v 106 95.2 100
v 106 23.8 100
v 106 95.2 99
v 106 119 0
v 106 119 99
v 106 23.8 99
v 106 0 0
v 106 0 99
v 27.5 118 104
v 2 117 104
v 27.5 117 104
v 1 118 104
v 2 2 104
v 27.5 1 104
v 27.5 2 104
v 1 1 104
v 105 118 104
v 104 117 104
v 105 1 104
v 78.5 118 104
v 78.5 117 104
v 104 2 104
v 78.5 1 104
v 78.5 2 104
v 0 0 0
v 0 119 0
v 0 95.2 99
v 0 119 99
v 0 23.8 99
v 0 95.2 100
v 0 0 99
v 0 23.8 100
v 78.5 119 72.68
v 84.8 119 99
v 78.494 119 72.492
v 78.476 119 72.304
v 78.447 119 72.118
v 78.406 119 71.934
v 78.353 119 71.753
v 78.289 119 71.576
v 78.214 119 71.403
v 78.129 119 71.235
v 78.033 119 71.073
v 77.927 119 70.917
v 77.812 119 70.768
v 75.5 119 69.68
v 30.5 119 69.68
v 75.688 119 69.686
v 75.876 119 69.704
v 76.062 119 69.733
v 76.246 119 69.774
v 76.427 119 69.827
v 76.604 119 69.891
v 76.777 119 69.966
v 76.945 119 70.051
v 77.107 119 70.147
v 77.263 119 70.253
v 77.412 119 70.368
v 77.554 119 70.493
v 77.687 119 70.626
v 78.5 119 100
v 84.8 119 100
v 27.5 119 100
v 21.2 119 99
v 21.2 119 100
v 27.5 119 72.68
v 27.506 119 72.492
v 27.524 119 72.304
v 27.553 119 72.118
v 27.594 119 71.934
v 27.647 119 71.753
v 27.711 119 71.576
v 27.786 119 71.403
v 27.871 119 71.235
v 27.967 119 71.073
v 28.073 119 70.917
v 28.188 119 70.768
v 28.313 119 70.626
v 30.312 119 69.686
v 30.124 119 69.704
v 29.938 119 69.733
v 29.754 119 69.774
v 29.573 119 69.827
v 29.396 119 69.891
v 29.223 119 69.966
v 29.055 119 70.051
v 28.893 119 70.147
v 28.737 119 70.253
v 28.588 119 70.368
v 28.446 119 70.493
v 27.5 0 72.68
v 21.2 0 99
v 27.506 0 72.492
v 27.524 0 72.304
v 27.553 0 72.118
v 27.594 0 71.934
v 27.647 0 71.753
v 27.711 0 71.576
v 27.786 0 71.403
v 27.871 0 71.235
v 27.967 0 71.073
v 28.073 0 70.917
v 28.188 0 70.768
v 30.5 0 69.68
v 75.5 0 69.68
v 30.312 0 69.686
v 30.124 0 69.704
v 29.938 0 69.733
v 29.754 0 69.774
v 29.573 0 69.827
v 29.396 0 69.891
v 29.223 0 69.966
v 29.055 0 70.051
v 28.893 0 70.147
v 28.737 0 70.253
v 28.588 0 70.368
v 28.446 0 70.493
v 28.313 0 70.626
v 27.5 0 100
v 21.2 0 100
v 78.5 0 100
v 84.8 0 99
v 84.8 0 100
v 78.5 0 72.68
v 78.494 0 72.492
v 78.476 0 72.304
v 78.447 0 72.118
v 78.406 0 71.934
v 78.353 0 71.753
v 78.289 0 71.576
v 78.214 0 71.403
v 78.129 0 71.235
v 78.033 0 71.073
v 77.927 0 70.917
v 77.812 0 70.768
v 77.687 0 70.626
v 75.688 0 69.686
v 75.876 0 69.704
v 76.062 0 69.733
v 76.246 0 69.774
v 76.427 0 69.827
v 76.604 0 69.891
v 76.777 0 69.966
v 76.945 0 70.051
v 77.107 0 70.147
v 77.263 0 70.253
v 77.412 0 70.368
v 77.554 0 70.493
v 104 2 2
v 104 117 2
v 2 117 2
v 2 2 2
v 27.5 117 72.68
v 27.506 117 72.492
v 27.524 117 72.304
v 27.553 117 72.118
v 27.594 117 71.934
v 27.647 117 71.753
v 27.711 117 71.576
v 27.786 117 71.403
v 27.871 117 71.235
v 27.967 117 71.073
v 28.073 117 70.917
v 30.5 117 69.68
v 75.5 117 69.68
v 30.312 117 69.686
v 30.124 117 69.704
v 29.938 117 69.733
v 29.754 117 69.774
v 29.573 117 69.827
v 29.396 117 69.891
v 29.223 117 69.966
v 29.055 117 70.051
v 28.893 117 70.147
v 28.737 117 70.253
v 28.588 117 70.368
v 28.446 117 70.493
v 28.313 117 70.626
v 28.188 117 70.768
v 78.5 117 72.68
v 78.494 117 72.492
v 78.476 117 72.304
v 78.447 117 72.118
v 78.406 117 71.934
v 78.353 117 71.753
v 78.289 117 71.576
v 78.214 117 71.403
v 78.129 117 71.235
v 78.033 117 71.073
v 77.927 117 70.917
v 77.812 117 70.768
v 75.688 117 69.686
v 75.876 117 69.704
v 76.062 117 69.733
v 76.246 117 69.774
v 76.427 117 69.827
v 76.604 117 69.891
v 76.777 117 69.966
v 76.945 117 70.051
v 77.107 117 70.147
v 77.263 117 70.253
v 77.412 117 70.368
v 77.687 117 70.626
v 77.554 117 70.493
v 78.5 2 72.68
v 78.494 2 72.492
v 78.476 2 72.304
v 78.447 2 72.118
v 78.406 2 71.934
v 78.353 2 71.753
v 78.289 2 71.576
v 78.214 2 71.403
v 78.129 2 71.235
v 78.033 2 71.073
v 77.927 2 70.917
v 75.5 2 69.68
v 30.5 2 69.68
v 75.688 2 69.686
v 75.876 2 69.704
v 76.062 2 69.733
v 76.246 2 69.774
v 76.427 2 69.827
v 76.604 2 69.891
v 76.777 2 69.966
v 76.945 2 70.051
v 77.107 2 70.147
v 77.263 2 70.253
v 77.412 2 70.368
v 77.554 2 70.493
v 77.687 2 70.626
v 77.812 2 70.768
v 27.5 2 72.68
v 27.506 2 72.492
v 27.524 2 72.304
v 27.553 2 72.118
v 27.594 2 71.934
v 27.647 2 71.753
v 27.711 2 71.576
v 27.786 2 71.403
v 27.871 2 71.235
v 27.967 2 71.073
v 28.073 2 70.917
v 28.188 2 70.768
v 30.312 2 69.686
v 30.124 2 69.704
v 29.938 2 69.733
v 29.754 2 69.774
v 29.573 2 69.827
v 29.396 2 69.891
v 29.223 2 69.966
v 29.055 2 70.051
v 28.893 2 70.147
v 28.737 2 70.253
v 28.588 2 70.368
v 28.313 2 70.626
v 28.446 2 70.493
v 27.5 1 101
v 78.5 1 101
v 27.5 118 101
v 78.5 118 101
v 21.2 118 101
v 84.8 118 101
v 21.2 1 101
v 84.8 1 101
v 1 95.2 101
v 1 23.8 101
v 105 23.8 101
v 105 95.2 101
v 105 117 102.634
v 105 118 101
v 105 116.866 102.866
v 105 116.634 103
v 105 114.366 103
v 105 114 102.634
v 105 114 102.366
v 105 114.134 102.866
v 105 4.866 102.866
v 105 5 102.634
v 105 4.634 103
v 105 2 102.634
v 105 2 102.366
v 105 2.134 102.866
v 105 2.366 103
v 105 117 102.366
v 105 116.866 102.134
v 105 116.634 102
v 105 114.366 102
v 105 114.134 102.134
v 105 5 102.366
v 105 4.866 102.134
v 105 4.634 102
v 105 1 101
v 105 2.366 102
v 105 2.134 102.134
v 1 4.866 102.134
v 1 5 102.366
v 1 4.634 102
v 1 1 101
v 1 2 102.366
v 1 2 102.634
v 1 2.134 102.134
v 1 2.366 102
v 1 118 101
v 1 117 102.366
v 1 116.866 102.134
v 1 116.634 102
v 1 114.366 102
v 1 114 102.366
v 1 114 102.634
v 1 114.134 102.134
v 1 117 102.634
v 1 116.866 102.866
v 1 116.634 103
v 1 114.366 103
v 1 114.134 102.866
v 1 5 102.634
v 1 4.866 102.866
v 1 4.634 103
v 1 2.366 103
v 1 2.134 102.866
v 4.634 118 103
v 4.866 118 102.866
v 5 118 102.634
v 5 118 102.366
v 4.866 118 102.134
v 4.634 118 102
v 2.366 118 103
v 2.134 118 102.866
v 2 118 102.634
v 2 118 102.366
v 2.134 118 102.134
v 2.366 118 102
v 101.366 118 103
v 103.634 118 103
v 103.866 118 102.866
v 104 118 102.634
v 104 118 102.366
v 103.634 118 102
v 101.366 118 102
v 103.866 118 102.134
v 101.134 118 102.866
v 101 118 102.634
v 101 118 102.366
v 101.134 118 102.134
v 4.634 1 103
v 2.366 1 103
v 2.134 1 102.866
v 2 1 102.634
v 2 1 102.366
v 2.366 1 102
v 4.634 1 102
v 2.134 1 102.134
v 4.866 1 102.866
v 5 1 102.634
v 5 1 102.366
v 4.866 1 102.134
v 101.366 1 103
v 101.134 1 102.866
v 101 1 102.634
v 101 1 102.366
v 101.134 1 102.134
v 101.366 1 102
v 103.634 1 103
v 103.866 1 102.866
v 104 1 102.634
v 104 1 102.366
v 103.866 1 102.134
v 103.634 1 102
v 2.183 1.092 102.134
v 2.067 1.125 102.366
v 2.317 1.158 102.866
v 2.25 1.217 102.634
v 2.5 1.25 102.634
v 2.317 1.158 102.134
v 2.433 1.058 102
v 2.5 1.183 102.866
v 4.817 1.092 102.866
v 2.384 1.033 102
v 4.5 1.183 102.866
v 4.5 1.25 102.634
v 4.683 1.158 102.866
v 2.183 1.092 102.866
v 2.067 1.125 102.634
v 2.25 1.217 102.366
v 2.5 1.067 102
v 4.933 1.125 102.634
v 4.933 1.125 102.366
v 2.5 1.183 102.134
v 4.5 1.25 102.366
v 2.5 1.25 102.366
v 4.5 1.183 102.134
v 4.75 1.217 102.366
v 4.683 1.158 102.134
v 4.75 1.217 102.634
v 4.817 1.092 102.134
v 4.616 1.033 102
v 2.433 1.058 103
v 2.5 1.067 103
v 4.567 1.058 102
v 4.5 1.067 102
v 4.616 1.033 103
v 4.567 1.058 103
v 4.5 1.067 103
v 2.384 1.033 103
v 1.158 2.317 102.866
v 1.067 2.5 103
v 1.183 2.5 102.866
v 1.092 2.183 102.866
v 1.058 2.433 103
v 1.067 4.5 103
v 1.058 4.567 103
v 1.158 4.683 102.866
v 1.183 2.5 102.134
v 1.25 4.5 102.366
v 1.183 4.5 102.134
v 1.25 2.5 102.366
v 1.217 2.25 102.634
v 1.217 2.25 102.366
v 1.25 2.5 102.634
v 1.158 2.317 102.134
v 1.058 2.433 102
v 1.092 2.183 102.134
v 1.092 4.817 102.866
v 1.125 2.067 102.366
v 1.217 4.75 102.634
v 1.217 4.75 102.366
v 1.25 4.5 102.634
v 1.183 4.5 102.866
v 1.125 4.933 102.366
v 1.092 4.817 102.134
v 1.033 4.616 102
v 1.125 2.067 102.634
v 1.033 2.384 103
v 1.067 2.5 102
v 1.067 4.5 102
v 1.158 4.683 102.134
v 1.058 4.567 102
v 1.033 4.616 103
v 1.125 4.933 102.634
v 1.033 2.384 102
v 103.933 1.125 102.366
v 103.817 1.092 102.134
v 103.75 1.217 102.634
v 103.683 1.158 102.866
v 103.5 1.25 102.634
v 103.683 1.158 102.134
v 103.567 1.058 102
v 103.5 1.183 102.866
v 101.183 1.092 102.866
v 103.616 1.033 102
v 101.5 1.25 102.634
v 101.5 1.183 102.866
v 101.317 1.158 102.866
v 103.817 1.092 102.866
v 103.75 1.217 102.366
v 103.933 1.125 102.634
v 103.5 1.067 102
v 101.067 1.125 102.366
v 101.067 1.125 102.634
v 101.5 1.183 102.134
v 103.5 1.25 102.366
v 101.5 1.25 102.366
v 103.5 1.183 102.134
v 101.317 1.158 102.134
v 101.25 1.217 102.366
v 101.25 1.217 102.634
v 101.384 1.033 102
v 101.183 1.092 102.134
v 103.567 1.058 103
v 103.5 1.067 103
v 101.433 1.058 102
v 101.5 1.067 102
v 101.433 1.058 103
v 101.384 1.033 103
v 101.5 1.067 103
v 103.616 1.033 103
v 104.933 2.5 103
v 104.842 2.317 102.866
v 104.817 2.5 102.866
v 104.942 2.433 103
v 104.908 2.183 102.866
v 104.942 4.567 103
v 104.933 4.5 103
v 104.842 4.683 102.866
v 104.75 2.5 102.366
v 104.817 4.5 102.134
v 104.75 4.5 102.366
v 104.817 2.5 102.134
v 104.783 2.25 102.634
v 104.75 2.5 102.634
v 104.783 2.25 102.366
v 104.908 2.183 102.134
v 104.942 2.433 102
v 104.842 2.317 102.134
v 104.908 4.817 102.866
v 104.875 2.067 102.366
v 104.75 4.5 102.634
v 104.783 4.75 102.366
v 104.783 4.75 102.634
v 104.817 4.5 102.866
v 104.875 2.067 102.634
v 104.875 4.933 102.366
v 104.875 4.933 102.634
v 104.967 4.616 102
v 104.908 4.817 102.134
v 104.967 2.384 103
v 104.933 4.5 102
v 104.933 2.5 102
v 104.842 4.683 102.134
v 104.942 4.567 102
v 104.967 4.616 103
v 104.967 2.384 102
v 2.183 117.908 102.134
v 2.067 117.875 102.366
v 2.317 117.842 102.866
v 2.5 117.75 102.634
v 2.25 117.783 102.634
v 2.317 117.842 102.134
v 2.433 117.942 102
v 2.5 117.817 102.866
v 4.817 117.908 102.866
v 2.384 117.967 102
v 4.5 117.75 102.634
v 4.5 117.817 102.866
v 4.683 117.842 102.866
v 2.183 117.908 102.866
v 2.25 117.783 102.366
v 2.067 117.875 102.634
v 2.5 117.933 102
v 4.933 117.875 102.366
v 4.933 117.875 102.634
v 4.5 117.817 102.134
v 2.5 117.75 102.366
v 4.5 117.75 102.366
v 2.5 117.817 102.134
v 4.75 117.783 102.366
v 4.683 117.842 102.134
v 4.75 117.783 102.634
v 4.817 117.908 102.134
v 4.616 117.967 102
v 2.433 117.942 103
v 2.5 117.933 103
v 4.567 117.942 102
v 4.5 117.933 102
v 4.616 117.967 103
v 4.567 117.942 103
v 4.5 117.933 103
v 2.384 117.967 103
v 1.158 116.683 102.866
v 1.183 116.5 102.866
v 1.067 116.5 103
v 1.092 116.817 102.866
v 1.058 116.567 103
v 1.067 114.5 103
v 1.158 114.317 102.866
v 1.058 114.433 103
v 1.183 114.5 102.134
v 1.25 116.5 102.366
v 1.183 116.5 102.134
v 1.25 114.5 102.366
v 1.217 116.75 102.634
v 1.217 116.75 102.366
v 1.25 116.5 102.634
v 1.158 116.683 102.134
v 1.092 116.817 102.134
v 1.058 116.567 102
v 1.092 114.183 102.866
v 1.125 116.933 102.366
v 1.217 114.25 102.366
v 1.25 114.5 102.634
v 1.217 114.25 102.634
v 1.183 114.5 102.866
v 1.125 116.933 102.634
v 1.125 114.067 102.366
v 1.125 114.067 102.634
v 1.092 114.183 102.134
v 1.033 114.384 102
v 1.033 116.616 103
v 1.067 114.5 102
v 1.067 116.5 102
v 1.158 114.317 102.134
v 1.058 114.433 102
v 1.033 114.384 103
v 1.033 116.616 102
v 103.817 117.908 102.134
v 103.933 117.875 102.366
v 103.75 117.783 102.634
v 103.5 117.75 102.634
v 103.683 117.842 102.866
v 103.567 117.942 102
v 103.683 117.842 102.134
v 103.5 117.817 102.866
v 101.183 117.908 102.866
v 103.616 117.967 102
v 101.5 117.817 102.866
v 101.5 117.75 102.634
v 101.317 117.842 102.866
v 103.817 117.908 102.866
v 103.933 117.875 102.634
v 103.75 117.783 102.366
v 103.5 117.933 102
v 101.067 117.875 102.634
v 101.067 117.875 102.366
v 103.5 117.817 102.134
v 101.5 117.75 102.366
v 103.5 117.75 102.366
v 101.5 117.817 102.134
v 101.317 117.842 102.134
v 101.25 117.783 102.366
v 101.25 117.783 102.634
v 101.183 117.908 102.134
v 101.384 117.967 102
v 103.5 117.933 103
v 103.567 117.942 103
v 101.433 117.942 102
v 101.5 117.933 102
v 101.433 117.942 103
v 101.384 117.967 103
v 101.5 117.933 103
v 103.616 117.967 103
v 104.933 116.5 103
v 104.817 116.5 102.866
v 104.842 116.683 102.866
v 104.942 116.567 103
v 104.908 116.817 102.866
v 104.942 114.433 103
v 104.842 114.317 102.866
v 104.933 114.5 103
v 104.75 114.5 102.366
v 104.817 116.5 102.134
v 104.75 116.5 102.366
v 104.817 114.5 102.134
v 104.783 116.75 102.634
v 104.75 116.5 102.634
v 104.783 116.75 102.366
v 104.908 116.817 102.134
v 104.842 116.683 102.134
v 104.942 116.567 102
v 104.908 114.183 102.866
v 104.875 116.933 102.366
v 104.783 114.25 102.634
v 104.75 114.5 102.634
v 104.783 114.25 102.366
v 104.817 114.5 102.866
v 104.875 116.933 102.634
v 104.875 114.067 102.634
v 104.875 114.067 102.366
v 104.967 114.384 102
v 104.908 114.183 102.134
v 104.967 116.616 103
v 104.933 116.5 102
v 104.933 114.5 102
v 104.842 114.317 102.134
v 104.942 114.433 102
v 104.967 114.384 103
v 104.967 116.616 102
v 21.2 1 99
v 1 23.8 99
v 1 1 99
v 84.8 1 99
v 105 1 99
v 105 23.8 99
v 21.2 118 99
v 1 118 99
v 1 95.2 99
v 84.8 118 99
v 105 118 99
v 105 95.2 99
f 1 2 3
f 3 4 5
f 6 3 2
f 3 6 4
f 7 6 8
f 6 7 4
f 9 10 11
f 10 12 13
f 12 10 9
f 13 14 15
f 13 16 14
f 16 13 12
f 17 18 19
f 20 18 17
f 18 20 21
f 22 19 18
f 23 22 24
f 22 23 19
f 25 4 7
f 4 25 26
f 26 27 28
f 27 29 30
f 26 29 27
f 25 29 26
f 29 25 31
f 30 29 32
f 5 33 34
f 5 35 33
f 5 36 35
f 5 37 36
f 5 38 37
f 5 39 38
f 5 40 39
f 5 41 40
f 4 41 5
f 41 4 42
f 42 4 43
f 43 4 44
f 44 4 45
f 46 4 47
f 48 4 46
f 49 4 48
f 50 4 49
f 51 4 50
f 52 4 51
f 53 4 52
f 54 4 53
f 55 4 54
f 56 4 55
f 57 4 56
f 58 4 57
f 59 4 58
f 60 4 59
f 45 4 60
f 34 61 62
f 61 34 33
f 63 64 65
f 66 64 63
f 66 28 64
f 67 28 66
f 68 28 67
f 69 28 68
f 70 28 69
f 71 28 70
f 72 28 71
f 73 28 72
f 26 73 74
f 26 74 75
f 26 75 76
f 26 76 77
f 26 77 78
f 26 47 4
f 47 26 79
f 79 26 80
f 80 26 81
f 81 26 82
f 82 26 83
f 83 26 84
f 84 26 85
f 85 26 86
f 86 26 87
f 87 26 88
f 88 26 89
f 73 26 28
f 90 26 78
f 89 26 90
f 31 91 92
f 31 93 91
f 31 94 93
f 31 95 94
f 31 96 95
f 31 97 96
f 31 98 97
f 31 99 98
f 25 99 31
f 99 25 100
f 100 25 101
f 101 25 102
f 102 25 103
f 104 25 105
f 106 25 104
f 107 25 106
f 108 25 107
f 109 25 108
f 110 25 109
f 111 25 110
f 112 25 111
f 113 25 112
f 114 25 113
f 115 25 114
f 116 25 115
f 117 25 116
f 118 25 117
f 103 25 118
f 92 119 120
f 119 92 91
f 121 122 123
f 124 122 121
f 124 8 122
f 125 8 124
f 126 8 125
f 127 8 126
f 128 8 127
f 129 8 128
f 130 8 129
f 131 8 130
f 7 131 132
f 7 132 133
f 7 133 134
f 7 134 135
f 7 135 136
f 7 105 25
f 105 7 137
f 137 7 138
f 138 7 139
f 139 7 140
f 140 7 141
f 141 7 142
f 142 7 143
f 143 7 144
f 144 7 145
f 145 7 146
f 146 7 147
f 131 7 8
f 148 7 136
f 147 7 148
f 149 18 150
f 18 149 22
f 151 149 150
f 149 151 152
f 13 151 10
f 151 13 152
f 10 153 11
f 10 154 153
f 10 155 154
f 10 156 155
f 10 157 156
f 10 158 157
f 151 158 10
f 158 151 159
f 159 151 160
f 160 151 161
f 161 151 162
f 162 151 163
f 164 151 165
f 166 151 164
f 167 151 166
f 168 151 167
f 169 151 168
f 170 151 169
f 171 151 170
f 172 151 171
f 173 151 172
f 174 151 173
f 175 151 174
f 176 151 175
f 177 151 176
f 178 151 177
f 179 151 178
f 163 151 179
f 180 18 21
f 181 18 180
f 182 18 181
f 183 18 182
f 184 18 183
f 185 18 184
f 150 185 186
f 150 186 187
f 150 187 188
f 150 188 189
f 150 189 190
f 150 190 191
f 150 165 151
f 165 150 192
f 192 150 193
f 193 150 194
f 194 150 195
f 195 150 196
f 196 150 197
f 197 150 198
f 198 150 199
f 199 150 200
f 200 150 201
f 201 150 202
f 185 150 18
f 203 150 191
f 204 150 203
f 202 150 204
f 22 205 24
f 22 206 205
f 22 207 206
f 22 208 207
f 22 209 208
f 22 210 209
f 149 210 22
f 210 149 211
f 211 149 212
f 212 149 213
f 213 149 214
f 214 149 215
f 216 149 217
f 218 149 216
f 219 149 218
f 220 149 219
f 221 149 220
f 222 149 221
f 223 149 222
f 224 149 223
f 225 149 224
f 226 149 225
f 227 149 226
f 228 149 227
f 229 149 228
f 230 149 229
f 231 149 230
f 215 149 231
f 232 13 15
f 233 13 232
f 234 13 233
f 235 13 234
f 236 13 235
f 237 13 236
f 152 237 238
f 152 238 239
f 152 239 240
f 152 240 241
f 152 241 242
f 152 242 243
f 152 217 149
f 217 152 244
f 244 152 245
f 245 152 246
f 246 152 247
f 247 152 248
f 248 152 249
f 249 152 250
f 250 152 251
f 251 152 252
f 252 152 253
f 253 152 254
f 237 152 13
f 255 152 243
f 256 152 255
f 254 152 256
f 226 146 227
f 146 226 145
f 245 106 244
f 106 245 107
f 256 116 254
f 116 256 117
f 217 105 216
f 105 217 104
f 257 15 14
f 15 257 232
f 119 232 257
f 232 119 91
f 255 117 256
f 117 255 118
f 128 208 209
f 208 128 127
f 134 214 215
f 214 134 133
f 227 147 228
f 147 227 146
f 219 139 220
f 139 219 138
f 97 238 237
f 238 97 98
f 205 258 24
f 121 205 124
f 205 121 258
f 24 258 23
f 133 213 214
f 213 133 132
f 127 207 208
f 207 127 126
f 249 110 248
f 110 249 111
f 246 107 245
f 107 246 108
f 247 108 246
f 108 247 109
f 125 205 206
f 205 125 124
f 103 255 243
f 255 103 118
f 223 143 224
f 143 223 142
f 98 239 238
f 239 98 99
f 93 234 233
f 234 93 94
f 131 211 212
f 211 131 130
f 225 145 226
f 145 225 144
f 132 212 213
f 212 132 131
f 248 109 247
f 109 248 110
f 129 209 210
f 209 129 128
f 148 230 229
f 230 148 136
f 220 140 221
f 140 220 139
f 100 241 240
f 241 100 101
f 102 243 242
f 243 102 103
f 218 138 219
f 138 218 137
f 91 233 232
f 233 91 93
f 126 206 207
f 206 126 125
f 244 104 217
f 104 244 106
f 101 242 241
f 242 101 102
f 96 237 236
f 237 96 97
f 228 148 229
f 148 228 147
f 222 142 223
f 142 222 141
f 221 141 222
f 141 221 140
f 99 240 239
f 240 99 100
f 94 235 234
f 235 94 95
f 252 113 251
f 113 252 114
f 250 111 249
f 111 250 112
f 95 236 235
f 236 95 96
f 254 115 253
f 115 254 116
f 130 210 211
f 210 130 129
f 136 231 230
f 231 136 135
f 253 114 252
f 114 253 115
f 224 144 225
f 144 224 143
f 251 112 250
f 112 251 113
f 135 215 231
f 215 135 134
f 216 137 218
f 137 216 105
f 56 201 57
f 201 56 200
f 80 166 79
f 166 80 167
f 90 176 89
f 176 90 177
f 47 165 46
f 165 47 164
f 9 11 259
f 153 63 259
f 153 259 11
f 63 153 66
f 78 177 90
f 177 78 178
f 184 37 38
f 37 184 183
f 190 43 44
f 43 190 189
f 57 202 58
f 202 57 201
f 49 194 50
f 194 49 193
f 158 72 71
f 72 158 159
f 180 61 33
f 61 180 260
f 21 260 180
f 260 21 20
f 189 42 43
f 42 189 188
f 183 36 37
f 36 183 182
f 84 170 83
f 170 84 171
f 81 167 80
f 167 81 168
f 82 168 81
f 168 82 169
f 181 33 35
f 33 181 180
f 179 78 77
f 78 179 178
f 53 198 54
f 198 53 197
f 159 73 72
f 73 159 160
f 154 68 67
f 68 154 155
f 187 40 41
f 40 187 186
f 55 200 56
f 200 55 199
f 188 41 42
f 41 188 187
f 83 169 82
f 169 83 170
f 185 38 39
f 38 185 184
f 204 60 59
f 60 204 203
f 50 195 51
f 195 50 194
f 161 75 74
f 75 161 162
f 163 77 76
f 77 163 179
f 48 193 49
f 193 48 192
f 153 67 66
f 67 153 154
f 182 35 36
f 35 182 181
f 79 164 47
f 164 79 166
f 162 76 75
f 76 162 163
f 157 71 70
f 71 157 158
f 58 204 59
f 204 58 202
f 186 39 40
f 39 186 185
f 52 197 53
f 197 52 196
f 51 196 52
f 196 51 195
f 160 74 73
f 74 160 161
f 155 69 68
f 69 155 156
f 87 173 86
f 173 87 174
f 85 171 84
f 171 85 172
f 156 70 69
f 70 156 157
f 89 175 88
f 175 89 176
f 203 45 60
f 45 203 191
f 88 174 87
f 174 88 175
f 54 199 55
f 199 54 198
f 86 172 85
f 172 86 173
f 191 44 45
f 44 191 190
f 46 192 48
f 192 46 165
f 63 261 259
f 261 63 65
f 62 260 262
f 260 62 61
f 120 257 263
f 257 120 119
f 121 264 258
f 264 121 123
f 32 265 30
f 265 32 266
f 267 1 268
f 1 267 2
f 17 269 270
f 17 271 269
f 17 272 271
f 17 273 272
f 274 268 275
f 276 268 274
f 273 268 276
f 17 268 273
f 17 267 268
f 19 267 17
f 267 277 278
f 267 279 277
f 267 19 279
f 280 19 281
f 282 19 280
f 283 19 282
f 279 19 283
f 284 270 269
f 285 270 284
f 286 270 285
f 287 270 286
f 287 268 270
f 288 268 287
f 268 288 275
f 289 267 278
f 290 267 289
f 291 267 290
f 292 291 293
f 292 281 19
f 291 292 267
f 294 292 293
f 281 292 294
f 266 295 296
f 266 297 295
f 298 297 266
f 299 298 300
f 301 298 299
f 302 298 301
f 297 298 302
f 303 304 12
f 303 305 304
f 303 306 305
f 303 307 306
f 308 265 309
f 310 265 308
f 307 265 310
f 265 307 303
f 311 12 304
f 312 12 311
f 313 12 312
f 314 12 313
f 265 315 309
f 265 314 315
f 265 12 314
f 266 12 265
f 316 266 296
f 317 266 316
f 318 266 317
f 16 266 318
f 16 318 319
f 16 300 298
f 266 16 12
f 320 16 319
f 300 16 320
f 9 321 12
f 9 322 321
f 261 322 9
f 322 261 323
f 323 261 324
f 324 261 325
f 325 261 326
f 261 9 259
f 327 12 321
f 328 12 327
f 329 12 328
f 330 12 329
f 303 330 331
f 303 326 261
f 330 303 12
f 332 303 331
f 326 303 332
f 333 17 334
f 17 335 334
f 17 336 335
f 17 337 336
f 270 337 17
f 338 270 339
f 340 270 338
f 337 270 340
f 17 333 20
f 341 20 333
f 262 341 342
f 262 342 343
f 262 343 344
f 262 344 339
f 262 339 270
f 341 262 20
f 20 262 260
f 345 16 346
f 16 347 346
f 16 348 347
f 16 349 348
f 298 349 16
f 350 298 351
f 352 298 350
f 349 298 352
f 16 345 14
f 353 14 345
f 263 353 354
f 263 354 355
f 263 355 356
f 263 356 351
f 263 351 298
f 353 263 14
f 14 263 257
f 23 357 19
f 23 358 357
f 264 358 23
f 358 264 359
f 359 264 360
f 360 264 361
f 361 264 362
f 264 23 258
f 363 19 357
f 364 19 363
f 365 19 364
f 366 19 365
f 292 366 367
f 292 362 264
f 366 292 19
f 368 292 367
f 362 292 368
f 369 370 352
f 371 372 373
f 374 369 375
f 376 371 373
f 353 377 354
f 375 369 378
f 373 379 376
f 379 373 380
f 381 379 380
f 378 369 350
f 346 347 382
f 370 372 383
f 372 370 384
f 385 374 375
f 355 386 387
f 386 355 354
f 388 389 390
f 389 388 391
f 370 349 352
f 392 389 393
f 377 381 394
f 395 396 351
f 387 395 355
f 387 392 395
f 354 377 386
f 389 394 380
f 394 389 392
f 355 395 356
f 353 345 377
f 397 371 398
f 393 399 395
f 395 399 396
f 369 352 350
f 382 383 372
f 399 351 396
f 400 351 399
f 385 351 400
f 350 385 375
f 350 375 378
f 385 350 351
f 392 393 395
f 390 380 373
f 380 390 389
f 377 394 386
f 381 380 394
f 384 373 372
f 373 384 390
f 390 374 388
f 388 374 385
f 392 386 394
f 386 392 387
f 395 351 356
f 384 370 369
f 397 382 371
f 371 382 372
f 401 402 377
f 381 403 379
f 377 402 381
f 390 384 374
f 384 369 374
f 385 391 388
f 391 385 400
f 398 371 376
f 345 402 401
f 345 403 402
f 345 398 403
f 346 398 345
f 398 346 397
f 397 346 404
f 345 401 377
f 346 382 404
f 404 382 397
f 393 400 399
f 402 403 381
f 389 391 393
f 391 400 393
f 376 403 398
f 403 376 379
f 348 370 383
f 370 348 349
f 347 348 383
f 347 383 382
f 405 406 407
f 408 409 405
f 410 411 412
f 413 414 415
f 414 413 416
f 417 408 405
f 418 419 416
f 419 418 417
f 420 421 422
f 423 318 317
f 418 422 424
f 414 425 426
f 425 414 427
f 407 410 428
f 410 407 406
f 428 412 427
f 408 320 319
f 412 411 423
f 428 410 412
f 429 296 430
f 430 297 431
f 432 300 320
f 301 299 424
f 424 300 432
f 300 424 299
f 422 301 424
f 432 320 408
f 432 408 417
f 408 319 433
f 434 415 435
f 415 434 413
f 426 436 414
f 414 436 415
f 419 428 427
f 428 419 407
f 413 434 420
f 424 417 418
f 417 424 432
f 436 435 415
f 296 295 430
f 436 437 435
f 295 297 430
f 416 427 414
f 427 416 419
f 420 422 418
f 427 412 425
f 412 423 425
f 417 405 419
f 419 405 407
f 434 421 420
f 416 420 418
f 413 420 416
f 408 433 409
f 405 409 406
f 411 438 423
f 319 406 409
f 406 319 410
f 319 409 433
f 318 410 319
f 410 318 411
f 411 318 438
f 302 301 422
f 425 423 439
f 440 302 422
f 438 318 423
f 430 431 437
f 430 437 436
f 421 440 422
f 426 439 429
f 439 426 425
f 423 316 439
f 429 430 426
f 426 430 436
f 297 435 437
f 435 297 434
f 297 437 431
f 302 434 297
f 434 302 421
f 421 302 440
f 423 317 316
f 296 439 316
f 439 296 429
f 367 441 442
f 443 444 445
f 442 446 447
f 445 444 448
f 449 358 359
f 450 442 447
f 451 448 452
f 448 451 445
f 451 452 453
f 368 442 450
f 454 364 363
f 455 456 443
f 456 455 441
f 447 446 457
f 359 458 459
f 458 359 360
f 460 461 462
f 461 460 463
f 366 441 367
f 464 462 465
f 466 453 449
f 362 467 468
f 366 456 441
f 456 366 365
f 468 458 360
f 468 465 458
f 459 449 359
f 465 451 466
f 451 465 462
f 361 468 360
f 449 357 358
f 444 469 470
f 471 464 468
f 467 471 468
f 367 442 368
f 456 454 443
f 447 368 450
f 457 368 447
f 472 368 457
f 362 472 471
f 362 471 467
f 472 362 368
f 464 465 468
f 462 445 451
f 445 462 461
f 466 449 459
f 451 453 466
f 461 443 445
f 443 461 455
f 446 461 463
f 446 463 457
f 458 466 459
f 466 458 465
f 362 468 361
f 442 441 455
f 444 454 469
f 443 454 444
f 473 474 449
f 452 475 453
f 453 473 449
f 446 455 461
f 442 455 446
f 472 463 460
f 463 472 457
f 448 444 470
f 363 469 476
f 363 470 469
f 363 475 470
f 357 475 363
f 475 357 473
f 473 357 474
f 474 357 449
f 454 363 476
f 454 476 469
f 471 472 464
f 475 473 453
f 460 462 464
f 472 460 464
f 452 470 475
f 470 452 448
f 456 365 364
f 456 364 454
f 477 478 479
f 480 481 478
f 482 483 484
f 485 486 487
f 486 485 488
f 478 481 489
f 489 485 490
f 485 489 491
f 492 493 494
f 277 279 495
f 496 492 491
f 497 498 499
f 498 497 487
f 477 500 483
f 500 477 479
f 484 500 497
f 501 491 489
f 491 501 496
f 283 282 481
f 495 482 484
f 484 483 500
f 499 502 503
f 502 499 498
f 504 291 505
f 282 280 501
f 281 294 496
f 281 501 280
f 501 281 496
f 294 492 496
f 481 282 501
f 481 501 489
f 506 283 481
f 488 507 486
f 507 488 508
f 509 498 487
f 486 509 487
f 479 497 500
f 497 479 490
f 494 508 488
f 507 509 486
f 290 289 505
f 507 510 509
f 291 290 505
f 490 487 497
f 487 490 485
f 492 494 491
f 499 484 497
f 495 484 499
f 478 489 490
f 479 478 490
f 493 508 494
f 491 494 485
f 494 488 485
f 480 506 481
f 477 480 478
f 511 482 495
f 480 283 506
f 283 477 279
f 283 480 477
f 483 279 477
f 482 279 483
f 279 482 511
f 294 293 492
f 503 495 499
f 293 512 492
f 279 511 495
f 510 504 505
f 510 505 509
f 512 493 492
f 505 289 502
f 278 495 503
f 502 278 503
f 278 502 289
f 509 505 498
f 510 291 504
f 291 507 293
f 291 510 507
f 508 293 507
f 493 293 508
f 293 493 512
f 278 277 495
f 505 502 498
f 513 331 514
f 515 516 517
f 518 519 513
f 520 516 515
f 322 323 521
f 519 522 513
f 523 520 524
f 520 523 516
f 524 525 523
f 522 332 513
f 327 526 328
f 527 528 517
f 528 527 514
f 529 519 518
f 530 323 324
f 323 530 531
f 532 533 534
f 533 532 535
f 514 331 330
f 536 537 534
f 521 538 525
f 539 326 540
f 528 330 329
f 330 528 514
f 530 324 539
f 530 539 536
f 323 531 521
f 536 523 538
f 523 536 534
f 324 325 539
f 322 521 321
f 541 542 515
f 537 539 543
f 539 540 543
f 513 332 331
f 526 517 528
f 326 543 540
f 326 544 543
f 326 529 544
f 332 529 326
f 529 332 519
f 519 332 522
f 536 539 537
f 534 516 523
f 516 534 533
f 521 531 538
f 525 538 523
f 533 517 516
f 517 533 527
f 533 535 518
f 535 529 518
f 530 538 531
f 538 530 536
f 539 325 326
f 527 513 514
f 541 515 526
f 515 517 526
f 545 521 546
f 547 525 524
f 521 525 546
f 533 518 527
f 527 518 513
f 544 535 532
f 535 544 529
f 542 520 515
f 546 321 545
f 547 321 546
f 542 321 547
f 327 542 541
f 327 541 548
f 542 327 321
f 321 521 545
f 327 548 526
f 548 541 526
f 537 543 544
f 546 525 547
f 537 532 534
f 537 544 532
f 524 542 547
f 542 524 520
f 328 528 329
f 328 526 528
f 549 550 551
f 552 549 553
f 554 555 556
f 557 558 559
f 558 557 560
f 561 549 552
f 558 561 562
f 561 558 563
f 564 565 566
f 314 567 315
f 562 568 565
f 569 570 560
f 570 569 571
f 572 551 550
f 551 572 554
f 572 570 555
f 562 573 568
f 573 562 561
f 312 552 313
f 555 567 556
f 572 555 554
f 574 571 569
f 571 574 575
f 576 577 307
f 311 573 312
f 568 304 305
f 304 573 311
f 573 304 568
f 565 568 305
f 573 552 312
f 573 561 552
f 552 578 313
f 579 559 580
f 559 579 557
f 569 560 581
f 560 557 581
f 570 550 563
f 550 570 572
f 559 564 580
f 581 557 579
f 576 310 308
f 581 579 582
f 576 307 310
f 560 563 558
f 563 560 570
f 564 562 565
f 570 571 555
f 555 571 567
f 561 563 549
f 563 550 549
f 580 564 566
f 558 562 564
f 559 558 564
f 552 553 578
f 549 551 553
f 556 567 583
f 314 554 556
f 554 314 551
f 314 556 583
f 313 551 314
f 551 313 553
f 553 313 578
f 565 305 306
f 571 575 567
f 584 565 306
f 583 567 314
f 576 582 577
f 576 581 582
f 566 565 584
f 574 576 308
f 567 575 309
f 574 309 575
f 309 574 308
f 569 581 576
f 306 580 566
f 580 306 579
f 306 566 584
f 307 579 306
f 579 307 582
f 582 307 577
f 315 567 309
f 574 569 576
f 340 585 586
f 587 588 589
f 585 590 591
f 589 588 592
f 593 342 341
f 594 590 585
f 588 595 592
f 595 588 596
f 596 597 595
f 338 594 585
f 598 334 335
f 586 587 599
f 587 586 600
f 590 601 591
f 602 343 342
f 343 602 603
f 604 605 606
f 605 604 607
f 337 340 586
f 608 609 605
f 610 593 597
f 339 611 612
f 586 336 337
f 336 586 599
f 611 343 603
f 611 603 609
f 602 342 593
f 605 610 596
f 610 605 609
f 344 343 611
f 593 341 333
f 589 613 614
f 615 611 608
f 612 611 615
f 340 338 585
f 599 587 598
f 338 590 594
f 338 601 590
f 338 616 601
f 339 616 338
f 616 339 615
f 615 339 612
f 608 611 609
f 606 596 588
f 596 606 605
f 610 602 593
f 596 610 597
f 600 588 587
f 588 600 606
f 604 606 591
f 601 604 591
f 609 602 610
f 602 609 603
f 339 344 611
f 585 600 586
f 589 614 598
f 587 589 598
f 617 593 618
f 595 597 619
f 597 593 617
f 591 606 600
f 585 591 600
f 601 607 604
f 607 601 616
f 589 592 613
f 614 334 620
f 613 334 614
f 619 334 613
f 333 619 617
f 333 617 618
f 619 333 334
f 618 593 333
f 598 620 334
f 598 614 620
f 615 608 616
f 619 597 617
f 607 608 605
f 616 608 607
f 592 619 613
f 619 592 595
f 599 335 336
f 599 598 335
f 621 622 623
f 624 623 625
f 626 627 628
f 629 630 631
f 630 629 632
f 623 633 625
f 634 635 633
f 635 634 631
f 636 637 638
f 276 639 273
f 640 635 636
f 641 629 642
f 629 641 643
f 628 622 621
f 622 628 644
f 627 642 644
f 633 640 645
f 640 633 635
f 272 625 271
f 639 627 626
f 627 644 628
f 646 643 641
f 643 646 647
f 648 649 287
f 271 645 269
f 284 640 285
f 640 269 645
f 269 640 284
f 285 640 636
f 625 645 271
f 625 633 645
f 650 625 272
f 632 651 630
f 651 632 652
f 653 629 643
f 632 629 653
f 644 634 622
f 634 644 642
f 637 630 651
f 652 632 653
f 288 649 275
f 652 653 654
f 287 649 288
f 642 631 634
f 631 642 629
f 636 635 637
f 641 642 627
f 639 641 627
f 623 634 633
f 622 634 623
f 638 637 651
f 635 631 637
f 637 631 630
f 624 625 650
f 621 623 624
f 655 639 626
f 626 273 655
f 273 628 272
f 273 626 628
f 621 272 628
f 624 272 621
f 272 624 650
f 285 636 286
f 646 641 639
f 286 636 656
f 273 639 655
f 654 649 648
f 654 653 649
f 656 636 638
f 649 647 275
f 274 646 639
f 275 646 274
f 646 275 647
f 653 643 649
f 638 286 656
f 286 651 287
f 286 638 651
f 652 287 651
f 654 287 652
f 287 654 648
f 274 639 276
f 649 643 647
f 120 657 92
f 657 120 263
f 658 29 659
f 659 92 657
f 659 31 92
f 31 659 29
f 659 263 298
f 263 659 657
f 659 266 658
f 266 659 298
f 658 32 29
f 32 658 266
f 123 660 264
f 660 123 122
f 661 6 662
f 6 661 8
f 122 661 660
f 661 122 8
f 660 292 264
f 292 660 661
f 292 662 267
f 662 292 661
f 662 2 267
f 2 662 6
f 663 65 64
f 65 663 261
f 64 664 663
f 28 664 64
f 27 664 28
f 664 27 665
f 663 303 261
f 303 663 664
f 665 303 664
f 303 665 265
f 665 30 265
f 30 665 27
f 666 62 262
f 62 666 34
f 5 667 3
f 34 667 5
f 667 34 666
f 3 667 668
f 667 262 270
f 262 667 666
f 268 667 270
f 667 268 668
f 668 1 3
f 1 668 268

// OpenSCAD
include <boardgame_insert_toolkit_lib.2.scad>;

// determines whether lids are output.
g_b_print_lid = false;

// determines whether boxes are output.
g_b_print_box = true; 

// Used to visualize how all of the boxes fit together. 
//g_b_visualization = true;          
        
// this is the outer wall thickness. 
//Default = 1.5mm
g_wall_thickness = 2.0;


// The tolerance value is extra space put between planes of the lid and box that fit together.
// Increase the tolerance to loosen the fit and decrease it to tighten it.
//
// Note that the tolerance is applied exclusively to the lid.
// So if the lid is too tight or too loose, change this value ( up for looser fit, down for tighter fit ) and 
// you only need to reprint the lid.
// 
// The exception is the stackable box, where the bottom of the box is the lid of the box below,
// in which case the tolerance also affects that box bottom.
//
g_tolerance = 0.15;

// This adjusts the position of the lid detents downward. 
// The larger the value, the bigger the gap between the lid and the box.
g_tolerance_detents_pos = 0.1;

card_sizes = [[68,91],[102,102]];
card_width = 68;
card_height = 91;
insert_font = "Libre Baskerville:style=Regular";

function label_offset(num_labels,index,label_gap,label_size) = 
    num_labels == 1 ? 0:((num_labels-1)*(label_gap+label_size))*((index/(num_labels-1))-0.5)*-1;

function boxLid( label, label_size, label_rotation,label_gap) =
    [ BOX_LID,
        [
            [ LID_PATTERN_RADIUS,           6],        
            //[ LID_PATTERN_N1,               6 ],
            //[ LID_PATTERN_N2,               3 ],
            //[ LID_PATTERN_ANGLE,            60 ],
            //[ LID_PATTERN_ROW_OFFSET,       10 ],
            //[ LID_PATTERN_COL_OFFSET,       140 ],
            [ LID_PATTERN_THICKNESS,        0.8 ],      
            [ LID_INSET_B, f ],
            [ LID_TABS_4B, [ t,t,t,t]],
            [ LID_FIT_UNDER_B, f],
            [ LID_LABELS_INVERT_B, t],
            for (i = [0:len(label)-1]) 
                [ LABEL,
                    [
                        [ LBL_TEXT,     label[i] ],
                        [ LBL_SIZE,     label_size],
                        [ ROTATION,     label_rotation ],
                        [ LBL_FONT,     insert_font],
                        [ POSITION_XY,   [label_rotation == 0?0:label_offset(len(label),i,label_gap,label_size),
                                          label_rotation == 90?0:label_offset(len(label),i,label_gap,label_size)]]
                    ]
                ], 
        ],
    ];
            
function spacer(spacer_name, x, y, height) =
    [spacer_name,
        [
            [ BOX_SIZE_XYZ, [x, y, height] ],
            [ TYPE, SPACER]
                          
        ]
    ];
    
function bottomLabel(label_text,y) = 
    [ LABEL,
        [
            [ LBL_DEPTH,        0.5],
            [ LBL_TEXT,         label_text],
            [ LBL_SIZE,         10 ],
            [ LBL_PLACEMENT,    BOTTOM],
            [ POSITION_XY,      [0,(y+3)/2 - 15] ]
        ]
    ];       
    
function squareCompartment(num,x,y,height,cutout_bottom, cutout_sides = [f,f,f,f]) = 
    [ BOX_COMPONENT,
        [
            [CMP_NUM_COMPARTMENTS_XY,   [num,1]],
            [CMP_COMPARTMENT_SIZE_XYZ,  [ x, y, height] ],
            [CMP_CUTOUT_BOTTOM_B,cutout_bottom],
            [CMP_CUTOUT_BOTTOM_PCT,40],
            [POSITION_XY, [CENTER,CENTER]],
            [CMP_CUTOUT_SIDES_4B,       cutout_sides], // all sides
            [CMP_CUTOUT_DEPTH_PCT,          20],
            [CMP_CUTOUT_WIDTH_PCT,          50],
            [CMP_CUTOUT_HEIGHT_PCT,         33],    
            [CMP_PADDING_HEIGHT_ADJUST_XY, [ -10, 0] ],
            [CMP_PADDING_XY, [ 2, 1 ] ]
        ]
    ];
        
function bowlCompartment(num,x,y,height,cutout) = 
    [ BOX_COMPONENT,
        [
            [CMP_NUM_COMPARTMENTS_XY,   [num,1]],
            [CMP_COMPARTMENT_SIZE_XYZ,  [ x, y, height] ],
            [POSITION_XY, [CENTER,CENTER]],
            [CMP_SHAPE, BOWL],
        ]
    ];
 
function bowlBox(box_name, label, height, stack ) = 
            bowl(box_name, 1, label,10, 90, card_width, card_height, height, stack);
function singleSpacer(spacer_name,height) = 
    spacer(spacer_name,((card_width+3) * 1), card_height+3,height);
function doubleSpacer(spacer_name,height) = 
            spacer(spacer_name,((card_width+3) * 2), card_height+3,height);
function tripleSpacer(spacer_name,height) = 
            spacer(spacer_name,((card_width+3) * 3), card_height+3,height);
function tripleCardBox(box_name, label, height, stack , label_size = 10) = 
            box(box_name, 3, label,label_size, 0, card_width, card_height, height, stack, t);
function doubleCardBox(box_name, label, height, stack , label_size = 10) = 
            box(box_name, 2, label,label_size, 0, card_width, card_height, height, stack, t);
function cardBox(box_name, label, height, stack , label_size = 10) = 
            box(box_name, 1, label,label_size, 90, card_width, card_height, height, stack, t);
function standardBox(box_name, label, height, stack , label_size = 10,shrink_x=0,shrink_y=0) = 
            box(box_name, 1, label,label_size, 90, card_width-shrink_x, card_height-shrink_y, height, stack, f);  
function halfSizeBox(box_name, label, height, stack ) =
            box(box_name, 1, label, 6, 0, card_width, (card_height/2 - 1.5), height, stack, f);
function thirdSizeBox(box_name,label, height, stack ) =
            box(box_name, 1, label, 4, 0, card_width, (card_height/3 - 1.5), height, stack, f);
function twoThirdsSizeBox(box_name,label, height, stack ) =
            box(box_name, 1, label,6,0,card_width,((card_height*2)/3 - 1.5),height,stack, f);     
function verticleCardBox(box_name, label, length, num_rows, divider_space=0,stack, card= 0) =
    box(box_name, num_rows, label,10,90,card_sizes[card][0], length, card_sizes[card][1]+divider_space,stack,f,cutout_sides = [t,t,f,f]);
            
function box( box_name, num_compartments, label, label_size, label_rotation, x, y, height, stack, cutout , padding = 2,cutout_sides = [f,f,f,f]) =
    [   box_name,
        [
            [ BOX_SIZE_XYZ, 
                [(x * num_compartments) + (num_compartments-1) * padding +g_wall_thickness * 2, 
                  y + 2 * g_wall_thickness, 
                  height + g_wall_thickness] ],  
            boxLid(label, label_size, label_rotation, 12),
            bottomLabel(stack,y),
            squareCompartment(num_compartments,x,y,height,cutout,cutout_sides),        
        ]
    ];
    
function bowl( box_name, num_compartments, label, label_size, label_rotation, x, y, height, stack) =
    [   box_name,
        [
            [ BOX_SIZE_XYZ, [((x+3) * num_compartments), y + 3, height + 1.5] ],  
            boxLid(label, label_size, label_rotation, 12),
            bottomLabel(stack,y),
            bowlCompartment(num_compartments,x,y,height),        
        ]
    ];
function divider( divider_name, label, tab_height,card = 0) = 
     [ divider_name,
        [
            [ TYPE,                     DIVIDERS ],

            [ DIV_TAB_TEXT,             [label]],
            [ DIV_TAB_TEXT_INVERTED,    true],

            [ DIV_TAB_TEXT_SIZE,        6],
            [ DIV_THICKNESS,            1],
            [ DIV_TAB_TEXT_CHAR_THRESHOLD, 20],

            [ DIV_TAB_SIZE_XY,          [card_sizes[card][0]-2, tab_height]],
            [ DIV_TAB_CYCLE,            2],
            [ DIV_TAB_CYCLE_START,      1],
            [ DIV_TAB_TEXT_FONT,        insert_font],

            [ DIV_FRAME_NUM_COLUMNS,    1],
            [ DIV_FRAME_SIZE_XY,        [card_sizes[card][0]-2, card_sizes[card][1]-2]],
            [ DIV_FRAME_COLUMN,         (card_sizes[card][0]-2) * 0.2],


        ]
    ];
    
function marker( marker_name, label, tab_height, card = 0) = 
     [ marker_name,
        [
            [ TYPE,                     DIVIDERS ],

            [ DIV_TAB_TEXT,             [label]],
            [ DIV_TAB_TEXT_INVERTED,    true],

            [ DIV_TAB_TEXT_SIZE,        20],
            [ DIV_THICKNESS,            0.75],
            [ DIV_TAB_TEXT_CHAR_THRESHOLD, 3],

            [ DIV_TAB_SIZE_XY,          [card_sizes[card][0]-2, tab_height]],
            [ DIV_TAB_CYCLE,            2],
            [ DIV_TAB_CYCLE_START,      1],
            [ DIV_TAB_TEXT_FONT,        insert_font],

            [ DIV_FRAME_NUM_COLUMNS,    -1],
            [ DIV_FRAME_SIZE_XY,        [card_sizes[card][0]-2, card_sizes[card][1]-tab_height]],
            [ DIV_FRAME_COLUMN,         15],


        ]
    ];
    
    
// Focus on one box
g_isolated_print_box = "Core Tile Cards"; 

data =
[
    // Secret Cards Box
    verticleCardBox("Secret Cards", ["Secret Cards"], 150, 2, 0, ""),
    marker("Removed Secrets Divider","Removed",50),
    
    // Player Careds and Dividers
    verticleCardBox("Player Cards", ["Player Cards"], 138, 1, 0,  ""),
    marker("Specialist Divider","Specialist",50),
    marker("Tough Guy Divider","Tough Guy",50),
    marker("Free Spirit Divider","Free Spirit",50),
    marker("Gambler Divider","Gambler",50),
    marker("Reaper Divider","Reaper",50),
    marker("Thorn Knight Divider","Thorn Knight",50),
    marker("Deck Marker","Deck",50),
    marker("Discard Marker","Discard",50),
    marker("Hand Marker","Hand",50),
    marker("Progress Marker","Progress",50),
    marker("Other Marker","Other",50),
    

    // Tiles Box and Dividers
    verticleCardBox("Core Tile Cards", ["Core Tiles"], 115, 1, 0,  "", 1),
    verticleCardBox("Expansion Tile Cards", ["Expansion Tiles"], 105, 1, 0,  "", 1),
    marker("Removed Tiles Divider","Removed",50,card = 1),
    marker("Current Dream Large Divider","Current Dream",50,card = 1),
    marker("Slumber Deck Divider","Slumber Deck",50,card = 1),
    marker("Slumber Map Divider","Slumber Map",50,card = 1),
    
    
    // Markets + Storage
    verticleCardBox("Markets + Storage", ["Markets + Storage"], 138, 1, 0,  ""),
    marker("Current Dream Small Divider","Current Dream",50),
    marker("Storage Divider","Storage",50),
    marker("Turns Divider","Turns",50),
    marker("Flaws Divider","Flaws",50),
    marker("Influence Market Divider","Influence",50),
    marker("Items Market Divider","Items",50),
    marker("Fate Divider","Fate",50),
    marker("Seasons Divider","Seasons",50),
    
    
    
    marker("Blank Marker","",50),
];

MakeAll();
